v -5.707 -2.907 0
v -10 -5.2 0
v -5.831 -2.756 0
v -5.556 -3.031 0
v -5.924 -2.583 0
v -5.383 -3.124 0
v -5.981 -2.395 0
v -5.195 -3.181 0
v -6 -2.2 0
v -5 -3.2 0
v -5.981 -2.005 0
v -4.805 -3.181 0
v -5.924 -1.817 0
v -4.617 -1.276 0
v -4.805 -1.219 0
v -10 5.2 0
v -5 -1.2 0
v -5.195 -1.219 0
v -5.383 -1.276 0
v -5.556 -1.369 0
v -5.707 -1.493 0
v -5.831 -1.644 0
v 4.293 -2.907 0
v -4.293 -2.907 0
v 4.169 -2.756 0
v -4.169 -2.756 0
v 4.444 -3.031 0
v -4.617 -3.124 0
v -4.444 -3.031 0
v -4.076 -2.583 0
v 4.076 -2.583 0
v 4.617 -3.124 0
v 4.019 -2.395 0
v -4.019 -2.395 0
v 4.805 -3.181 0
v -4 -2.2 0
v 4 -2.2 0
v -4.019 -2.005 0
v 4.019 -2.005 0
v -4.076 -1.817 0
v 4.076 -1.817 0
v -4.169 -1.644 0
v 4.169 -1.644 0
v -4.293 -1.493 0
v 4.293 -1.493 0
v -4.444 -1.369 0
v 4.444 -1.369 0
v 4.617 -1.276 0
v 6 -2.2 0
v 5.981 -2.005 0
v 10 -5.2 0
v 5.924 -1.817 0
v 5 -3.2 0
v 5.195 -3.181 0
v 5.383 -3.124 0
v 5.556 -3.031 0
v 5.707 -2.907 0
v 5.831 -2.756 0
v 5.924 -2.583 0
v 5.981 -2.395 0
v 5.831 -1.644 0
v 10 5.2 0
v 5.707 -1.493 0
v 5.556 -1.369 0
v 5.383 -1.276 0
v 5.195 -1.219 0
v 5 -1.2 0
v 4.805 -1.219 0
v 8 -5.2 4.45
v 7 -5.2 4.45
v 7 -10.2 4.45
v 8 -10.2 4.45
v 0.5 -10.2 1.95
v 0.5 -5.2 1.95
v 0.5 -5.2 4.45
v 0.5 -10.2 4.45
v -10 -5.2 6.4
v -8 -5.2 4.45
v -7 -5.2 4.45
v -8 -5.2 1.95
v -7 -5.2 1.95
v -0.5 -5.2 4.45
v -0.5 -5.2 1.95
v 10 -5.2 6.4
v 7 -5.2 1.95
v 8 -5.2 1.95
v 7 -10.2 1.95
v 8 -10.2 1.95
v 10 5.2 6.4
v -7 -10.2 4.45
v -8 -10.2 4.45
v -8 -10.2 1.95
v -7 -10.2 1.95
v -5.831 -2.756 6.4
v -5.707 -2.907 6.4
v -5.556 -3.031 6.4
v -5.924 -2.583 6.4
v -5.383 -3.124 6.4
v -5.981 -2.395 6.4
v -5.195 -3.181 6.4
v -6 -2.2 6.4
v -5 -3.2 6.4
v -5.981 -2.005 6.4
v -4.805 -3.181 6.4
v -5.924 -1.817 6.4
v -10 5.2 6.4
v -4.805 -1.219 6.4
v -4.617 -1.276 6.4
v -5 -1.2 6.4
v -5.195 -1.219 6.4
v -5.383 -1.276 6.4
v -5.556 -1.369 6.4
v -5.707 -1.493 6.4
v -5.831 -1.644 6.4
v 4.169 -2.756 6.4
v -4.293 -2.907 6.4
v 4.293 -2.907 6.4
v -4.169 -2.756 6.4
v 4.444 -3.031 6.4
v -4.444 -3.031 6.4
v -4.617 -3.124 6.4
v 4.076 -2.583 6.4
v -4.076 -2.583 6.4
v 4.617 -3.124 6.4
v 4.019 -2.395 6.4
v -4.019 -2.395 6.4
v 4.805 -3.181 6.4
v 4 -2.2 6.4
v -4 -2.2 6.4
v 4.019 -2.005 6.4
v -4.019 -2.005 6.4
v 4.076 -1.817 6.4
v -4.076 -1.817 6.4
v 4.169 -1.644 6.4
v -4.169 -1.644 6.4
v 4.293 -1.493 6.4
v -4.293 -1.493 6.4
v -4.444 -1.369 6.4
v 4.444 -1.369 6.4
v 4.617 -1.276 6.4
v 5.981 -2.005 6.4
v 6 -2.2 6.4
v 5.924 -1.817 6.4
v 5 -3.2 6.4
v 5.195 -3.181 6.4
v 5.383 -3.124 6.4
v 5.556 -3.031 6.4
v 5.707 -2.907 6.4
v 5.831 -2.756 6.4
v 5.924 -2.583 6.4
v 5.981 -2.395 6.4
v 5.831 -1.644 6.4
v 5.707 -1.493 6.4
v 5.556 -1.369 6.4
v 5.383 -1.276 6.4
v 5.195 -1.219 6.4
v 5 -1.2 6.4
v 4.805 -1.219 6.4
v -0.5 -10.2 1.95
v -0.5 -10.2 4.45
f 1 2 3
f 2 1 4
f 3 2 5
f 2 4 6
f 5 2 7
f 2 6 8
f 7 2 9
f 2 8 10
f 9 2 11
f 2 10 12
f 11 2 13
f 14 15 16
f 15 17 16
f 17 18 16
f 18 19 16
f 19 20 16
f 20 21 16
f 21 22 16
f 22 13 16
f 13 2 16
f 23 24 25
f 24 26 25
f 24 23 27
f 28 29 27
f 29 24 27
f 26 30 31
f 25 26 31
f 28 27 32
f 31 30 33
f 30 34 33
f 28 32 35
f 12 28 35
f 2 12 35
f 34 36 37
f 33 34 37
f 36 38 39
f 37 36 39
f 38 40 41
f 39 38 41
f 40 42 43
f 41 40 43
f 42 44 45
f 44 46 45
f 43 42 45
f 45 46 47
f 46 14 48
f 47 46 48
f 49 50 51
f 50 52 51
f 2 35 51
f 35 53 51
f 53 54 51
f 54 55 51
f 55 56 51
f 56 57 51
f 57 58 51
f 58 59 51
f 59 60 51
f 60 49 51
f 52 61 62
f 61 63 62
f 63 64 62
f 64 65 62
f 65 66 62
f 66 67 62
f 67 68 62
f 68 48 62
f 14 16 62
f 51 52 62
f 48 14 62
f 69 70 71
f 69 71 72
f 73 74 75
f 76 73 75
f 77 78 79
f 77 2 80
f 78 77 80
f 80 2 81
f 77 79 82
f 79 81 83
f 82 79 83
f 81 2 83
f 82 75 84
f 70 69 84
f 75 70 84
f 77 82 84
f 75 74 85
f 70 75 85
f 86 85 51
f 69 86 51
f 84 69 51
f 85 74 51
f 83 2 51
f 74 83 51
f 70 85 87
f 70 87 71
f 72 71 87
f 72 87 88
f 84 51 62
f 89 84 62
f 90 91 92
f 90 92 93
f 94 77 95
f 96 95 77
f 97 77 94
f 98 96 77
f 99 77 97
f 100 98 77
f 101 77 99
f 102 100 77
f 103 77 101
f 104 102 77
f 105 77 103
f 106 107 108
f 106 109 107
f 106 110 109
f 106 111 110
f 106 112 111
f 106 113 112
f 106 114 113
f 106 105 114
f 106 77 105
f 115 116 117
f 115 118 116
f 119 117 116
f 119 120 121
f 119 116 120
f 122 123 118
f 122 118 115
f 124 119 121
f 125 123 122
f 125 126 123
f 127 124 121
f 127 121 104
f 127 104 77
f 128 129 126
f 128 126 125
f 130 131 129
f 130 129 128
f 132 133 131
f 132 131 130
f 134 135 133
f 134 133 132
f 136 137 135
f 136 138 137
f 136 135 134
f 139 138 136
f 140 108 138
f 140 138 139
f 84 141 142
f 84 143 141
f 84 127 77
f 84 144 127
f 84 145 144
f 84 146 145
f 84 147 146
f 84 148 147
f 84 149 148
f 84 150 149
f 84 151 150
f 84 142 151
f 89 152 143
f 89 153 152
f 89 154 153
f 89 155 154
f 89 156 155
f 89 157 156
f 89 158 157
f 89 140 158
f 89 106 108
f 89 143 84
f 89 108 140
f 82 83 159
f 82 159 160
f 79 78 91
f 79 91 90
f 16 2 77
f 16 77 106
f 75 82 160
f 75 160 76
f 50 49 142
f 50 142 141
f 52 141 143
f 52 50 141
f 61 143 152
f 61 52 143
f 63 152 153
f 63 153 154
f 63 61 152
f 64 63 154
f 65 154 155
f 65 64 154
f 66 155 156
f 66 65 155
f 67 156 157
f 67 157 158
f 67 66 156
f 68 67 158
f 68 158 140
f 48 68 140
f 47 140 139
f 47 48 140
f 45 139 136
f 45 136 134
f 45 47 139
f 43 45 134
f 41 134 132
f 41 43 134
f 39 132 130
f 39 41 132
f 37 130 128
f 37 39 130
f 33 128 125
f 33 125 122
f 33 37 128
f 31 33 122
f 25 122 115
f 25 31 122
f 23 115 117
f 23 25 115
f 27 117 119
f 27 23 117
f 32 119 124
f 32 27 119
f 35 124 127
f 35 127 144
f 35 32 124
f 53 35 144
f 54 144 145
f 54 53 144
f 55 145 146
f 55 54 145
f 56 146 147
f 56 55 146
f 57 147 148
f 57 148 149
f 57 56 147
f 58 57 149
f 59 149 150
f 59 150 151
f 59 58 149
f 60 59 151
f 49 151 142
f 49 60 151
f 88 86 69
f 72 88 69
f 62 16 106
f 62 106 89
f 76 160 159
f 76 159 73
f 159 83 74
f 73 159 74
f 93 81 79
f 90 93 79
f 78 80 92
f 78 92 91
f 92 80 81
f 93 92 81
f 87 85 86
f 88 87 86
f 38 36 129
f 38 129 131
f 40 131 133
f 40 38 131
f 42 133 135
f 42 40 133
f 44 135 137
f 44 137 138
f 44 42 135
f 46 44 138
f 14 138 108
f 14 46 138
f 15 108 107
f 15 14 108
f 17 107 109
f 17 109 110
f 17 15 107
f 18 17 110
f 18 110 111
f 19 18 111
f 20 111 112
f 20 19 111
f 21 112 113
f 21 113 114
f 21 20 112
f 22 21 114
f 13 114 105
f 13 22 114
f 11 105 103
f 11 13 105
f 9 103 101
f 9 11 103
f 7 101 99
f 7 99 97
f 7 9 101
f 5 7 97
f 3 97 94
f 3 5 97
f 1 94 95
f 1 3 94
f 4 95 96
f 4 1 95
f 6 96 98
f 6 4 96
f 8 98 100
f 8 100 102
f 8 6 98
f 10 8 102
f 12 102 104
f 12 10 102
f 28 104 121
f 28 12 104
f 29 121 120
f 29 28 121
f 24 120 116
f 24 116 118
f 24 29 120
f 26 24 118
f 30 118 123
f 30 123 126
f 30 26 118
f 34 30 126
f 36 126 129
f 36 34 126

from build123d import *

# Parameters (mm, degrees)
ESQUISSE1_W        = 20
ESQUISSE1_H        = 10.4
ESQUISSE1_R        = 1
BOSS_EXTRU_1_DEPTH = 6.4
ESQUISSE2_W        = 1
ESQUISSE2_H        = 2.5
BOSS_EXTRU_2_DEPTH = 5


with BuildPart() as part:
    # Esquisse1 → Boss.-Extru.1 (new body)
    with BuildSketch(Plane.XY):
        Rectangle(ESQUISSE1_W, ESQUISSE1_H)
        with Locations((-5, -2.2)):
            Circle(ESQUISSE1_R, mode=Mode.SUBTRACT)
        with Locations((5, -2.2)):
            Circle(ESQUISSE1_R, mode=Mode.SUBTRACT)
    extrude(amount=BOSS_EXTRU_1_DEPTH)

    # Esquisse2 → Boss.-Extru.2 (add)
    with BuildSketch(Plane.XZ.offset(5.2)):
        with Locations((-7.5, 3.2)):
            Rectangle(ESQUISSE2_W, ESQUISSE2_H)
        with Locations((0, 3.2)):
            Rectangle(ESQUISSE2_W, ESQUISSE2_H)
        with Locations((7.5, 3.2)):
            Rectangle(ESQUISSE2_W, ESQUISSE2_H)
    extrude(amount=BOSS_EXTRU_2_DEPTH)


solid = part.part
